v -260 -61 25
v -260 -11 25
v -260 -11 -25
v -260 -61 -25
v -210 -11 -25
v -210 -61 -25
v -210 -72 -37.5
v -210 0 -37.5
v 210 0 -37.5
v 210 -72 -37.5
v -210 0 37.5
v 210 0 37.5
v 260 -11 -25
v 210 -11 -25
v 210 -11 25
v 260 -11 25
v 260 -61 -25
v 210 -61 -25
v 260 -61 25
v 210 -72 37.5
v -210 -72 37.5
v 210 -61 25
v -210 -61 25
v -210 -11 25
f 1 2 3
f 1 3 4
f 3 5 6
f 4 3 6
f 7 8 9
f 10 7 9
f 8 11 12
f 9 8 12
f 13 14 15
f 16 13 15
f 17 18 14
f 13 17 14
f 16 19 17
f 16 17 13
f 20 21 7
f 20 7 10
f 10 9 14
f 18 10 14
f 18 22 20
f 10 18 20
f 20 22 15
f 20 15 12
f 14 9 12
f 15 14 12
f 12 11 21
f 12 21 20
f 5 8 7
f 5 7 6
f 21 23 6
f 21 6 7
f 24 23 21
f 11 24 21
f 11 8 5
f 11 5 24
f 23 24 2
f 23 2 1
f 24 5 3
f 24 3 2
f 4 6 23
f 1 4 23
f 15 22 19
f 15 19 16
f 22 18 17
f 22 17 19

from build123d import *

# Parameters (mm, degrees)
F0_W     = 420
F0_H     = 75
F1_DEPTH = 72
F2_W     = 50
F2_H     = 50
F3_DEPTH = 50
F4_W     = 50
F4_H     = 50
F5_DEPTH = 50


with BuildPart() as f1:
    # F0 (on Front) → F1 (new body)
    with BuildSketch(Plane.XZ):
        Rectangle(F0_W, F0_H)
    extrude(amount=F1_DEPTH)

    # F2 (on face) → F3 (join)
    with BuildSketch(Plane.YZ.offset(210)):
        with Locations((-36, 0)):
            Rectangle(F2_W, F2_H)
    extrude(amount=F3_DEPTH)

    # F4 (on face) → F5 (join)
    with BuildSketch(Plane(origin=(-210, 0, 0), x_dir=(0, -1, 0), z_dir=(-1, 0, 0))):
        with Locations((36, 0)):
            Rectangle(F4_W, F4_H)
    extrude(amount=F5_DEPTH)


solid = f1.part
